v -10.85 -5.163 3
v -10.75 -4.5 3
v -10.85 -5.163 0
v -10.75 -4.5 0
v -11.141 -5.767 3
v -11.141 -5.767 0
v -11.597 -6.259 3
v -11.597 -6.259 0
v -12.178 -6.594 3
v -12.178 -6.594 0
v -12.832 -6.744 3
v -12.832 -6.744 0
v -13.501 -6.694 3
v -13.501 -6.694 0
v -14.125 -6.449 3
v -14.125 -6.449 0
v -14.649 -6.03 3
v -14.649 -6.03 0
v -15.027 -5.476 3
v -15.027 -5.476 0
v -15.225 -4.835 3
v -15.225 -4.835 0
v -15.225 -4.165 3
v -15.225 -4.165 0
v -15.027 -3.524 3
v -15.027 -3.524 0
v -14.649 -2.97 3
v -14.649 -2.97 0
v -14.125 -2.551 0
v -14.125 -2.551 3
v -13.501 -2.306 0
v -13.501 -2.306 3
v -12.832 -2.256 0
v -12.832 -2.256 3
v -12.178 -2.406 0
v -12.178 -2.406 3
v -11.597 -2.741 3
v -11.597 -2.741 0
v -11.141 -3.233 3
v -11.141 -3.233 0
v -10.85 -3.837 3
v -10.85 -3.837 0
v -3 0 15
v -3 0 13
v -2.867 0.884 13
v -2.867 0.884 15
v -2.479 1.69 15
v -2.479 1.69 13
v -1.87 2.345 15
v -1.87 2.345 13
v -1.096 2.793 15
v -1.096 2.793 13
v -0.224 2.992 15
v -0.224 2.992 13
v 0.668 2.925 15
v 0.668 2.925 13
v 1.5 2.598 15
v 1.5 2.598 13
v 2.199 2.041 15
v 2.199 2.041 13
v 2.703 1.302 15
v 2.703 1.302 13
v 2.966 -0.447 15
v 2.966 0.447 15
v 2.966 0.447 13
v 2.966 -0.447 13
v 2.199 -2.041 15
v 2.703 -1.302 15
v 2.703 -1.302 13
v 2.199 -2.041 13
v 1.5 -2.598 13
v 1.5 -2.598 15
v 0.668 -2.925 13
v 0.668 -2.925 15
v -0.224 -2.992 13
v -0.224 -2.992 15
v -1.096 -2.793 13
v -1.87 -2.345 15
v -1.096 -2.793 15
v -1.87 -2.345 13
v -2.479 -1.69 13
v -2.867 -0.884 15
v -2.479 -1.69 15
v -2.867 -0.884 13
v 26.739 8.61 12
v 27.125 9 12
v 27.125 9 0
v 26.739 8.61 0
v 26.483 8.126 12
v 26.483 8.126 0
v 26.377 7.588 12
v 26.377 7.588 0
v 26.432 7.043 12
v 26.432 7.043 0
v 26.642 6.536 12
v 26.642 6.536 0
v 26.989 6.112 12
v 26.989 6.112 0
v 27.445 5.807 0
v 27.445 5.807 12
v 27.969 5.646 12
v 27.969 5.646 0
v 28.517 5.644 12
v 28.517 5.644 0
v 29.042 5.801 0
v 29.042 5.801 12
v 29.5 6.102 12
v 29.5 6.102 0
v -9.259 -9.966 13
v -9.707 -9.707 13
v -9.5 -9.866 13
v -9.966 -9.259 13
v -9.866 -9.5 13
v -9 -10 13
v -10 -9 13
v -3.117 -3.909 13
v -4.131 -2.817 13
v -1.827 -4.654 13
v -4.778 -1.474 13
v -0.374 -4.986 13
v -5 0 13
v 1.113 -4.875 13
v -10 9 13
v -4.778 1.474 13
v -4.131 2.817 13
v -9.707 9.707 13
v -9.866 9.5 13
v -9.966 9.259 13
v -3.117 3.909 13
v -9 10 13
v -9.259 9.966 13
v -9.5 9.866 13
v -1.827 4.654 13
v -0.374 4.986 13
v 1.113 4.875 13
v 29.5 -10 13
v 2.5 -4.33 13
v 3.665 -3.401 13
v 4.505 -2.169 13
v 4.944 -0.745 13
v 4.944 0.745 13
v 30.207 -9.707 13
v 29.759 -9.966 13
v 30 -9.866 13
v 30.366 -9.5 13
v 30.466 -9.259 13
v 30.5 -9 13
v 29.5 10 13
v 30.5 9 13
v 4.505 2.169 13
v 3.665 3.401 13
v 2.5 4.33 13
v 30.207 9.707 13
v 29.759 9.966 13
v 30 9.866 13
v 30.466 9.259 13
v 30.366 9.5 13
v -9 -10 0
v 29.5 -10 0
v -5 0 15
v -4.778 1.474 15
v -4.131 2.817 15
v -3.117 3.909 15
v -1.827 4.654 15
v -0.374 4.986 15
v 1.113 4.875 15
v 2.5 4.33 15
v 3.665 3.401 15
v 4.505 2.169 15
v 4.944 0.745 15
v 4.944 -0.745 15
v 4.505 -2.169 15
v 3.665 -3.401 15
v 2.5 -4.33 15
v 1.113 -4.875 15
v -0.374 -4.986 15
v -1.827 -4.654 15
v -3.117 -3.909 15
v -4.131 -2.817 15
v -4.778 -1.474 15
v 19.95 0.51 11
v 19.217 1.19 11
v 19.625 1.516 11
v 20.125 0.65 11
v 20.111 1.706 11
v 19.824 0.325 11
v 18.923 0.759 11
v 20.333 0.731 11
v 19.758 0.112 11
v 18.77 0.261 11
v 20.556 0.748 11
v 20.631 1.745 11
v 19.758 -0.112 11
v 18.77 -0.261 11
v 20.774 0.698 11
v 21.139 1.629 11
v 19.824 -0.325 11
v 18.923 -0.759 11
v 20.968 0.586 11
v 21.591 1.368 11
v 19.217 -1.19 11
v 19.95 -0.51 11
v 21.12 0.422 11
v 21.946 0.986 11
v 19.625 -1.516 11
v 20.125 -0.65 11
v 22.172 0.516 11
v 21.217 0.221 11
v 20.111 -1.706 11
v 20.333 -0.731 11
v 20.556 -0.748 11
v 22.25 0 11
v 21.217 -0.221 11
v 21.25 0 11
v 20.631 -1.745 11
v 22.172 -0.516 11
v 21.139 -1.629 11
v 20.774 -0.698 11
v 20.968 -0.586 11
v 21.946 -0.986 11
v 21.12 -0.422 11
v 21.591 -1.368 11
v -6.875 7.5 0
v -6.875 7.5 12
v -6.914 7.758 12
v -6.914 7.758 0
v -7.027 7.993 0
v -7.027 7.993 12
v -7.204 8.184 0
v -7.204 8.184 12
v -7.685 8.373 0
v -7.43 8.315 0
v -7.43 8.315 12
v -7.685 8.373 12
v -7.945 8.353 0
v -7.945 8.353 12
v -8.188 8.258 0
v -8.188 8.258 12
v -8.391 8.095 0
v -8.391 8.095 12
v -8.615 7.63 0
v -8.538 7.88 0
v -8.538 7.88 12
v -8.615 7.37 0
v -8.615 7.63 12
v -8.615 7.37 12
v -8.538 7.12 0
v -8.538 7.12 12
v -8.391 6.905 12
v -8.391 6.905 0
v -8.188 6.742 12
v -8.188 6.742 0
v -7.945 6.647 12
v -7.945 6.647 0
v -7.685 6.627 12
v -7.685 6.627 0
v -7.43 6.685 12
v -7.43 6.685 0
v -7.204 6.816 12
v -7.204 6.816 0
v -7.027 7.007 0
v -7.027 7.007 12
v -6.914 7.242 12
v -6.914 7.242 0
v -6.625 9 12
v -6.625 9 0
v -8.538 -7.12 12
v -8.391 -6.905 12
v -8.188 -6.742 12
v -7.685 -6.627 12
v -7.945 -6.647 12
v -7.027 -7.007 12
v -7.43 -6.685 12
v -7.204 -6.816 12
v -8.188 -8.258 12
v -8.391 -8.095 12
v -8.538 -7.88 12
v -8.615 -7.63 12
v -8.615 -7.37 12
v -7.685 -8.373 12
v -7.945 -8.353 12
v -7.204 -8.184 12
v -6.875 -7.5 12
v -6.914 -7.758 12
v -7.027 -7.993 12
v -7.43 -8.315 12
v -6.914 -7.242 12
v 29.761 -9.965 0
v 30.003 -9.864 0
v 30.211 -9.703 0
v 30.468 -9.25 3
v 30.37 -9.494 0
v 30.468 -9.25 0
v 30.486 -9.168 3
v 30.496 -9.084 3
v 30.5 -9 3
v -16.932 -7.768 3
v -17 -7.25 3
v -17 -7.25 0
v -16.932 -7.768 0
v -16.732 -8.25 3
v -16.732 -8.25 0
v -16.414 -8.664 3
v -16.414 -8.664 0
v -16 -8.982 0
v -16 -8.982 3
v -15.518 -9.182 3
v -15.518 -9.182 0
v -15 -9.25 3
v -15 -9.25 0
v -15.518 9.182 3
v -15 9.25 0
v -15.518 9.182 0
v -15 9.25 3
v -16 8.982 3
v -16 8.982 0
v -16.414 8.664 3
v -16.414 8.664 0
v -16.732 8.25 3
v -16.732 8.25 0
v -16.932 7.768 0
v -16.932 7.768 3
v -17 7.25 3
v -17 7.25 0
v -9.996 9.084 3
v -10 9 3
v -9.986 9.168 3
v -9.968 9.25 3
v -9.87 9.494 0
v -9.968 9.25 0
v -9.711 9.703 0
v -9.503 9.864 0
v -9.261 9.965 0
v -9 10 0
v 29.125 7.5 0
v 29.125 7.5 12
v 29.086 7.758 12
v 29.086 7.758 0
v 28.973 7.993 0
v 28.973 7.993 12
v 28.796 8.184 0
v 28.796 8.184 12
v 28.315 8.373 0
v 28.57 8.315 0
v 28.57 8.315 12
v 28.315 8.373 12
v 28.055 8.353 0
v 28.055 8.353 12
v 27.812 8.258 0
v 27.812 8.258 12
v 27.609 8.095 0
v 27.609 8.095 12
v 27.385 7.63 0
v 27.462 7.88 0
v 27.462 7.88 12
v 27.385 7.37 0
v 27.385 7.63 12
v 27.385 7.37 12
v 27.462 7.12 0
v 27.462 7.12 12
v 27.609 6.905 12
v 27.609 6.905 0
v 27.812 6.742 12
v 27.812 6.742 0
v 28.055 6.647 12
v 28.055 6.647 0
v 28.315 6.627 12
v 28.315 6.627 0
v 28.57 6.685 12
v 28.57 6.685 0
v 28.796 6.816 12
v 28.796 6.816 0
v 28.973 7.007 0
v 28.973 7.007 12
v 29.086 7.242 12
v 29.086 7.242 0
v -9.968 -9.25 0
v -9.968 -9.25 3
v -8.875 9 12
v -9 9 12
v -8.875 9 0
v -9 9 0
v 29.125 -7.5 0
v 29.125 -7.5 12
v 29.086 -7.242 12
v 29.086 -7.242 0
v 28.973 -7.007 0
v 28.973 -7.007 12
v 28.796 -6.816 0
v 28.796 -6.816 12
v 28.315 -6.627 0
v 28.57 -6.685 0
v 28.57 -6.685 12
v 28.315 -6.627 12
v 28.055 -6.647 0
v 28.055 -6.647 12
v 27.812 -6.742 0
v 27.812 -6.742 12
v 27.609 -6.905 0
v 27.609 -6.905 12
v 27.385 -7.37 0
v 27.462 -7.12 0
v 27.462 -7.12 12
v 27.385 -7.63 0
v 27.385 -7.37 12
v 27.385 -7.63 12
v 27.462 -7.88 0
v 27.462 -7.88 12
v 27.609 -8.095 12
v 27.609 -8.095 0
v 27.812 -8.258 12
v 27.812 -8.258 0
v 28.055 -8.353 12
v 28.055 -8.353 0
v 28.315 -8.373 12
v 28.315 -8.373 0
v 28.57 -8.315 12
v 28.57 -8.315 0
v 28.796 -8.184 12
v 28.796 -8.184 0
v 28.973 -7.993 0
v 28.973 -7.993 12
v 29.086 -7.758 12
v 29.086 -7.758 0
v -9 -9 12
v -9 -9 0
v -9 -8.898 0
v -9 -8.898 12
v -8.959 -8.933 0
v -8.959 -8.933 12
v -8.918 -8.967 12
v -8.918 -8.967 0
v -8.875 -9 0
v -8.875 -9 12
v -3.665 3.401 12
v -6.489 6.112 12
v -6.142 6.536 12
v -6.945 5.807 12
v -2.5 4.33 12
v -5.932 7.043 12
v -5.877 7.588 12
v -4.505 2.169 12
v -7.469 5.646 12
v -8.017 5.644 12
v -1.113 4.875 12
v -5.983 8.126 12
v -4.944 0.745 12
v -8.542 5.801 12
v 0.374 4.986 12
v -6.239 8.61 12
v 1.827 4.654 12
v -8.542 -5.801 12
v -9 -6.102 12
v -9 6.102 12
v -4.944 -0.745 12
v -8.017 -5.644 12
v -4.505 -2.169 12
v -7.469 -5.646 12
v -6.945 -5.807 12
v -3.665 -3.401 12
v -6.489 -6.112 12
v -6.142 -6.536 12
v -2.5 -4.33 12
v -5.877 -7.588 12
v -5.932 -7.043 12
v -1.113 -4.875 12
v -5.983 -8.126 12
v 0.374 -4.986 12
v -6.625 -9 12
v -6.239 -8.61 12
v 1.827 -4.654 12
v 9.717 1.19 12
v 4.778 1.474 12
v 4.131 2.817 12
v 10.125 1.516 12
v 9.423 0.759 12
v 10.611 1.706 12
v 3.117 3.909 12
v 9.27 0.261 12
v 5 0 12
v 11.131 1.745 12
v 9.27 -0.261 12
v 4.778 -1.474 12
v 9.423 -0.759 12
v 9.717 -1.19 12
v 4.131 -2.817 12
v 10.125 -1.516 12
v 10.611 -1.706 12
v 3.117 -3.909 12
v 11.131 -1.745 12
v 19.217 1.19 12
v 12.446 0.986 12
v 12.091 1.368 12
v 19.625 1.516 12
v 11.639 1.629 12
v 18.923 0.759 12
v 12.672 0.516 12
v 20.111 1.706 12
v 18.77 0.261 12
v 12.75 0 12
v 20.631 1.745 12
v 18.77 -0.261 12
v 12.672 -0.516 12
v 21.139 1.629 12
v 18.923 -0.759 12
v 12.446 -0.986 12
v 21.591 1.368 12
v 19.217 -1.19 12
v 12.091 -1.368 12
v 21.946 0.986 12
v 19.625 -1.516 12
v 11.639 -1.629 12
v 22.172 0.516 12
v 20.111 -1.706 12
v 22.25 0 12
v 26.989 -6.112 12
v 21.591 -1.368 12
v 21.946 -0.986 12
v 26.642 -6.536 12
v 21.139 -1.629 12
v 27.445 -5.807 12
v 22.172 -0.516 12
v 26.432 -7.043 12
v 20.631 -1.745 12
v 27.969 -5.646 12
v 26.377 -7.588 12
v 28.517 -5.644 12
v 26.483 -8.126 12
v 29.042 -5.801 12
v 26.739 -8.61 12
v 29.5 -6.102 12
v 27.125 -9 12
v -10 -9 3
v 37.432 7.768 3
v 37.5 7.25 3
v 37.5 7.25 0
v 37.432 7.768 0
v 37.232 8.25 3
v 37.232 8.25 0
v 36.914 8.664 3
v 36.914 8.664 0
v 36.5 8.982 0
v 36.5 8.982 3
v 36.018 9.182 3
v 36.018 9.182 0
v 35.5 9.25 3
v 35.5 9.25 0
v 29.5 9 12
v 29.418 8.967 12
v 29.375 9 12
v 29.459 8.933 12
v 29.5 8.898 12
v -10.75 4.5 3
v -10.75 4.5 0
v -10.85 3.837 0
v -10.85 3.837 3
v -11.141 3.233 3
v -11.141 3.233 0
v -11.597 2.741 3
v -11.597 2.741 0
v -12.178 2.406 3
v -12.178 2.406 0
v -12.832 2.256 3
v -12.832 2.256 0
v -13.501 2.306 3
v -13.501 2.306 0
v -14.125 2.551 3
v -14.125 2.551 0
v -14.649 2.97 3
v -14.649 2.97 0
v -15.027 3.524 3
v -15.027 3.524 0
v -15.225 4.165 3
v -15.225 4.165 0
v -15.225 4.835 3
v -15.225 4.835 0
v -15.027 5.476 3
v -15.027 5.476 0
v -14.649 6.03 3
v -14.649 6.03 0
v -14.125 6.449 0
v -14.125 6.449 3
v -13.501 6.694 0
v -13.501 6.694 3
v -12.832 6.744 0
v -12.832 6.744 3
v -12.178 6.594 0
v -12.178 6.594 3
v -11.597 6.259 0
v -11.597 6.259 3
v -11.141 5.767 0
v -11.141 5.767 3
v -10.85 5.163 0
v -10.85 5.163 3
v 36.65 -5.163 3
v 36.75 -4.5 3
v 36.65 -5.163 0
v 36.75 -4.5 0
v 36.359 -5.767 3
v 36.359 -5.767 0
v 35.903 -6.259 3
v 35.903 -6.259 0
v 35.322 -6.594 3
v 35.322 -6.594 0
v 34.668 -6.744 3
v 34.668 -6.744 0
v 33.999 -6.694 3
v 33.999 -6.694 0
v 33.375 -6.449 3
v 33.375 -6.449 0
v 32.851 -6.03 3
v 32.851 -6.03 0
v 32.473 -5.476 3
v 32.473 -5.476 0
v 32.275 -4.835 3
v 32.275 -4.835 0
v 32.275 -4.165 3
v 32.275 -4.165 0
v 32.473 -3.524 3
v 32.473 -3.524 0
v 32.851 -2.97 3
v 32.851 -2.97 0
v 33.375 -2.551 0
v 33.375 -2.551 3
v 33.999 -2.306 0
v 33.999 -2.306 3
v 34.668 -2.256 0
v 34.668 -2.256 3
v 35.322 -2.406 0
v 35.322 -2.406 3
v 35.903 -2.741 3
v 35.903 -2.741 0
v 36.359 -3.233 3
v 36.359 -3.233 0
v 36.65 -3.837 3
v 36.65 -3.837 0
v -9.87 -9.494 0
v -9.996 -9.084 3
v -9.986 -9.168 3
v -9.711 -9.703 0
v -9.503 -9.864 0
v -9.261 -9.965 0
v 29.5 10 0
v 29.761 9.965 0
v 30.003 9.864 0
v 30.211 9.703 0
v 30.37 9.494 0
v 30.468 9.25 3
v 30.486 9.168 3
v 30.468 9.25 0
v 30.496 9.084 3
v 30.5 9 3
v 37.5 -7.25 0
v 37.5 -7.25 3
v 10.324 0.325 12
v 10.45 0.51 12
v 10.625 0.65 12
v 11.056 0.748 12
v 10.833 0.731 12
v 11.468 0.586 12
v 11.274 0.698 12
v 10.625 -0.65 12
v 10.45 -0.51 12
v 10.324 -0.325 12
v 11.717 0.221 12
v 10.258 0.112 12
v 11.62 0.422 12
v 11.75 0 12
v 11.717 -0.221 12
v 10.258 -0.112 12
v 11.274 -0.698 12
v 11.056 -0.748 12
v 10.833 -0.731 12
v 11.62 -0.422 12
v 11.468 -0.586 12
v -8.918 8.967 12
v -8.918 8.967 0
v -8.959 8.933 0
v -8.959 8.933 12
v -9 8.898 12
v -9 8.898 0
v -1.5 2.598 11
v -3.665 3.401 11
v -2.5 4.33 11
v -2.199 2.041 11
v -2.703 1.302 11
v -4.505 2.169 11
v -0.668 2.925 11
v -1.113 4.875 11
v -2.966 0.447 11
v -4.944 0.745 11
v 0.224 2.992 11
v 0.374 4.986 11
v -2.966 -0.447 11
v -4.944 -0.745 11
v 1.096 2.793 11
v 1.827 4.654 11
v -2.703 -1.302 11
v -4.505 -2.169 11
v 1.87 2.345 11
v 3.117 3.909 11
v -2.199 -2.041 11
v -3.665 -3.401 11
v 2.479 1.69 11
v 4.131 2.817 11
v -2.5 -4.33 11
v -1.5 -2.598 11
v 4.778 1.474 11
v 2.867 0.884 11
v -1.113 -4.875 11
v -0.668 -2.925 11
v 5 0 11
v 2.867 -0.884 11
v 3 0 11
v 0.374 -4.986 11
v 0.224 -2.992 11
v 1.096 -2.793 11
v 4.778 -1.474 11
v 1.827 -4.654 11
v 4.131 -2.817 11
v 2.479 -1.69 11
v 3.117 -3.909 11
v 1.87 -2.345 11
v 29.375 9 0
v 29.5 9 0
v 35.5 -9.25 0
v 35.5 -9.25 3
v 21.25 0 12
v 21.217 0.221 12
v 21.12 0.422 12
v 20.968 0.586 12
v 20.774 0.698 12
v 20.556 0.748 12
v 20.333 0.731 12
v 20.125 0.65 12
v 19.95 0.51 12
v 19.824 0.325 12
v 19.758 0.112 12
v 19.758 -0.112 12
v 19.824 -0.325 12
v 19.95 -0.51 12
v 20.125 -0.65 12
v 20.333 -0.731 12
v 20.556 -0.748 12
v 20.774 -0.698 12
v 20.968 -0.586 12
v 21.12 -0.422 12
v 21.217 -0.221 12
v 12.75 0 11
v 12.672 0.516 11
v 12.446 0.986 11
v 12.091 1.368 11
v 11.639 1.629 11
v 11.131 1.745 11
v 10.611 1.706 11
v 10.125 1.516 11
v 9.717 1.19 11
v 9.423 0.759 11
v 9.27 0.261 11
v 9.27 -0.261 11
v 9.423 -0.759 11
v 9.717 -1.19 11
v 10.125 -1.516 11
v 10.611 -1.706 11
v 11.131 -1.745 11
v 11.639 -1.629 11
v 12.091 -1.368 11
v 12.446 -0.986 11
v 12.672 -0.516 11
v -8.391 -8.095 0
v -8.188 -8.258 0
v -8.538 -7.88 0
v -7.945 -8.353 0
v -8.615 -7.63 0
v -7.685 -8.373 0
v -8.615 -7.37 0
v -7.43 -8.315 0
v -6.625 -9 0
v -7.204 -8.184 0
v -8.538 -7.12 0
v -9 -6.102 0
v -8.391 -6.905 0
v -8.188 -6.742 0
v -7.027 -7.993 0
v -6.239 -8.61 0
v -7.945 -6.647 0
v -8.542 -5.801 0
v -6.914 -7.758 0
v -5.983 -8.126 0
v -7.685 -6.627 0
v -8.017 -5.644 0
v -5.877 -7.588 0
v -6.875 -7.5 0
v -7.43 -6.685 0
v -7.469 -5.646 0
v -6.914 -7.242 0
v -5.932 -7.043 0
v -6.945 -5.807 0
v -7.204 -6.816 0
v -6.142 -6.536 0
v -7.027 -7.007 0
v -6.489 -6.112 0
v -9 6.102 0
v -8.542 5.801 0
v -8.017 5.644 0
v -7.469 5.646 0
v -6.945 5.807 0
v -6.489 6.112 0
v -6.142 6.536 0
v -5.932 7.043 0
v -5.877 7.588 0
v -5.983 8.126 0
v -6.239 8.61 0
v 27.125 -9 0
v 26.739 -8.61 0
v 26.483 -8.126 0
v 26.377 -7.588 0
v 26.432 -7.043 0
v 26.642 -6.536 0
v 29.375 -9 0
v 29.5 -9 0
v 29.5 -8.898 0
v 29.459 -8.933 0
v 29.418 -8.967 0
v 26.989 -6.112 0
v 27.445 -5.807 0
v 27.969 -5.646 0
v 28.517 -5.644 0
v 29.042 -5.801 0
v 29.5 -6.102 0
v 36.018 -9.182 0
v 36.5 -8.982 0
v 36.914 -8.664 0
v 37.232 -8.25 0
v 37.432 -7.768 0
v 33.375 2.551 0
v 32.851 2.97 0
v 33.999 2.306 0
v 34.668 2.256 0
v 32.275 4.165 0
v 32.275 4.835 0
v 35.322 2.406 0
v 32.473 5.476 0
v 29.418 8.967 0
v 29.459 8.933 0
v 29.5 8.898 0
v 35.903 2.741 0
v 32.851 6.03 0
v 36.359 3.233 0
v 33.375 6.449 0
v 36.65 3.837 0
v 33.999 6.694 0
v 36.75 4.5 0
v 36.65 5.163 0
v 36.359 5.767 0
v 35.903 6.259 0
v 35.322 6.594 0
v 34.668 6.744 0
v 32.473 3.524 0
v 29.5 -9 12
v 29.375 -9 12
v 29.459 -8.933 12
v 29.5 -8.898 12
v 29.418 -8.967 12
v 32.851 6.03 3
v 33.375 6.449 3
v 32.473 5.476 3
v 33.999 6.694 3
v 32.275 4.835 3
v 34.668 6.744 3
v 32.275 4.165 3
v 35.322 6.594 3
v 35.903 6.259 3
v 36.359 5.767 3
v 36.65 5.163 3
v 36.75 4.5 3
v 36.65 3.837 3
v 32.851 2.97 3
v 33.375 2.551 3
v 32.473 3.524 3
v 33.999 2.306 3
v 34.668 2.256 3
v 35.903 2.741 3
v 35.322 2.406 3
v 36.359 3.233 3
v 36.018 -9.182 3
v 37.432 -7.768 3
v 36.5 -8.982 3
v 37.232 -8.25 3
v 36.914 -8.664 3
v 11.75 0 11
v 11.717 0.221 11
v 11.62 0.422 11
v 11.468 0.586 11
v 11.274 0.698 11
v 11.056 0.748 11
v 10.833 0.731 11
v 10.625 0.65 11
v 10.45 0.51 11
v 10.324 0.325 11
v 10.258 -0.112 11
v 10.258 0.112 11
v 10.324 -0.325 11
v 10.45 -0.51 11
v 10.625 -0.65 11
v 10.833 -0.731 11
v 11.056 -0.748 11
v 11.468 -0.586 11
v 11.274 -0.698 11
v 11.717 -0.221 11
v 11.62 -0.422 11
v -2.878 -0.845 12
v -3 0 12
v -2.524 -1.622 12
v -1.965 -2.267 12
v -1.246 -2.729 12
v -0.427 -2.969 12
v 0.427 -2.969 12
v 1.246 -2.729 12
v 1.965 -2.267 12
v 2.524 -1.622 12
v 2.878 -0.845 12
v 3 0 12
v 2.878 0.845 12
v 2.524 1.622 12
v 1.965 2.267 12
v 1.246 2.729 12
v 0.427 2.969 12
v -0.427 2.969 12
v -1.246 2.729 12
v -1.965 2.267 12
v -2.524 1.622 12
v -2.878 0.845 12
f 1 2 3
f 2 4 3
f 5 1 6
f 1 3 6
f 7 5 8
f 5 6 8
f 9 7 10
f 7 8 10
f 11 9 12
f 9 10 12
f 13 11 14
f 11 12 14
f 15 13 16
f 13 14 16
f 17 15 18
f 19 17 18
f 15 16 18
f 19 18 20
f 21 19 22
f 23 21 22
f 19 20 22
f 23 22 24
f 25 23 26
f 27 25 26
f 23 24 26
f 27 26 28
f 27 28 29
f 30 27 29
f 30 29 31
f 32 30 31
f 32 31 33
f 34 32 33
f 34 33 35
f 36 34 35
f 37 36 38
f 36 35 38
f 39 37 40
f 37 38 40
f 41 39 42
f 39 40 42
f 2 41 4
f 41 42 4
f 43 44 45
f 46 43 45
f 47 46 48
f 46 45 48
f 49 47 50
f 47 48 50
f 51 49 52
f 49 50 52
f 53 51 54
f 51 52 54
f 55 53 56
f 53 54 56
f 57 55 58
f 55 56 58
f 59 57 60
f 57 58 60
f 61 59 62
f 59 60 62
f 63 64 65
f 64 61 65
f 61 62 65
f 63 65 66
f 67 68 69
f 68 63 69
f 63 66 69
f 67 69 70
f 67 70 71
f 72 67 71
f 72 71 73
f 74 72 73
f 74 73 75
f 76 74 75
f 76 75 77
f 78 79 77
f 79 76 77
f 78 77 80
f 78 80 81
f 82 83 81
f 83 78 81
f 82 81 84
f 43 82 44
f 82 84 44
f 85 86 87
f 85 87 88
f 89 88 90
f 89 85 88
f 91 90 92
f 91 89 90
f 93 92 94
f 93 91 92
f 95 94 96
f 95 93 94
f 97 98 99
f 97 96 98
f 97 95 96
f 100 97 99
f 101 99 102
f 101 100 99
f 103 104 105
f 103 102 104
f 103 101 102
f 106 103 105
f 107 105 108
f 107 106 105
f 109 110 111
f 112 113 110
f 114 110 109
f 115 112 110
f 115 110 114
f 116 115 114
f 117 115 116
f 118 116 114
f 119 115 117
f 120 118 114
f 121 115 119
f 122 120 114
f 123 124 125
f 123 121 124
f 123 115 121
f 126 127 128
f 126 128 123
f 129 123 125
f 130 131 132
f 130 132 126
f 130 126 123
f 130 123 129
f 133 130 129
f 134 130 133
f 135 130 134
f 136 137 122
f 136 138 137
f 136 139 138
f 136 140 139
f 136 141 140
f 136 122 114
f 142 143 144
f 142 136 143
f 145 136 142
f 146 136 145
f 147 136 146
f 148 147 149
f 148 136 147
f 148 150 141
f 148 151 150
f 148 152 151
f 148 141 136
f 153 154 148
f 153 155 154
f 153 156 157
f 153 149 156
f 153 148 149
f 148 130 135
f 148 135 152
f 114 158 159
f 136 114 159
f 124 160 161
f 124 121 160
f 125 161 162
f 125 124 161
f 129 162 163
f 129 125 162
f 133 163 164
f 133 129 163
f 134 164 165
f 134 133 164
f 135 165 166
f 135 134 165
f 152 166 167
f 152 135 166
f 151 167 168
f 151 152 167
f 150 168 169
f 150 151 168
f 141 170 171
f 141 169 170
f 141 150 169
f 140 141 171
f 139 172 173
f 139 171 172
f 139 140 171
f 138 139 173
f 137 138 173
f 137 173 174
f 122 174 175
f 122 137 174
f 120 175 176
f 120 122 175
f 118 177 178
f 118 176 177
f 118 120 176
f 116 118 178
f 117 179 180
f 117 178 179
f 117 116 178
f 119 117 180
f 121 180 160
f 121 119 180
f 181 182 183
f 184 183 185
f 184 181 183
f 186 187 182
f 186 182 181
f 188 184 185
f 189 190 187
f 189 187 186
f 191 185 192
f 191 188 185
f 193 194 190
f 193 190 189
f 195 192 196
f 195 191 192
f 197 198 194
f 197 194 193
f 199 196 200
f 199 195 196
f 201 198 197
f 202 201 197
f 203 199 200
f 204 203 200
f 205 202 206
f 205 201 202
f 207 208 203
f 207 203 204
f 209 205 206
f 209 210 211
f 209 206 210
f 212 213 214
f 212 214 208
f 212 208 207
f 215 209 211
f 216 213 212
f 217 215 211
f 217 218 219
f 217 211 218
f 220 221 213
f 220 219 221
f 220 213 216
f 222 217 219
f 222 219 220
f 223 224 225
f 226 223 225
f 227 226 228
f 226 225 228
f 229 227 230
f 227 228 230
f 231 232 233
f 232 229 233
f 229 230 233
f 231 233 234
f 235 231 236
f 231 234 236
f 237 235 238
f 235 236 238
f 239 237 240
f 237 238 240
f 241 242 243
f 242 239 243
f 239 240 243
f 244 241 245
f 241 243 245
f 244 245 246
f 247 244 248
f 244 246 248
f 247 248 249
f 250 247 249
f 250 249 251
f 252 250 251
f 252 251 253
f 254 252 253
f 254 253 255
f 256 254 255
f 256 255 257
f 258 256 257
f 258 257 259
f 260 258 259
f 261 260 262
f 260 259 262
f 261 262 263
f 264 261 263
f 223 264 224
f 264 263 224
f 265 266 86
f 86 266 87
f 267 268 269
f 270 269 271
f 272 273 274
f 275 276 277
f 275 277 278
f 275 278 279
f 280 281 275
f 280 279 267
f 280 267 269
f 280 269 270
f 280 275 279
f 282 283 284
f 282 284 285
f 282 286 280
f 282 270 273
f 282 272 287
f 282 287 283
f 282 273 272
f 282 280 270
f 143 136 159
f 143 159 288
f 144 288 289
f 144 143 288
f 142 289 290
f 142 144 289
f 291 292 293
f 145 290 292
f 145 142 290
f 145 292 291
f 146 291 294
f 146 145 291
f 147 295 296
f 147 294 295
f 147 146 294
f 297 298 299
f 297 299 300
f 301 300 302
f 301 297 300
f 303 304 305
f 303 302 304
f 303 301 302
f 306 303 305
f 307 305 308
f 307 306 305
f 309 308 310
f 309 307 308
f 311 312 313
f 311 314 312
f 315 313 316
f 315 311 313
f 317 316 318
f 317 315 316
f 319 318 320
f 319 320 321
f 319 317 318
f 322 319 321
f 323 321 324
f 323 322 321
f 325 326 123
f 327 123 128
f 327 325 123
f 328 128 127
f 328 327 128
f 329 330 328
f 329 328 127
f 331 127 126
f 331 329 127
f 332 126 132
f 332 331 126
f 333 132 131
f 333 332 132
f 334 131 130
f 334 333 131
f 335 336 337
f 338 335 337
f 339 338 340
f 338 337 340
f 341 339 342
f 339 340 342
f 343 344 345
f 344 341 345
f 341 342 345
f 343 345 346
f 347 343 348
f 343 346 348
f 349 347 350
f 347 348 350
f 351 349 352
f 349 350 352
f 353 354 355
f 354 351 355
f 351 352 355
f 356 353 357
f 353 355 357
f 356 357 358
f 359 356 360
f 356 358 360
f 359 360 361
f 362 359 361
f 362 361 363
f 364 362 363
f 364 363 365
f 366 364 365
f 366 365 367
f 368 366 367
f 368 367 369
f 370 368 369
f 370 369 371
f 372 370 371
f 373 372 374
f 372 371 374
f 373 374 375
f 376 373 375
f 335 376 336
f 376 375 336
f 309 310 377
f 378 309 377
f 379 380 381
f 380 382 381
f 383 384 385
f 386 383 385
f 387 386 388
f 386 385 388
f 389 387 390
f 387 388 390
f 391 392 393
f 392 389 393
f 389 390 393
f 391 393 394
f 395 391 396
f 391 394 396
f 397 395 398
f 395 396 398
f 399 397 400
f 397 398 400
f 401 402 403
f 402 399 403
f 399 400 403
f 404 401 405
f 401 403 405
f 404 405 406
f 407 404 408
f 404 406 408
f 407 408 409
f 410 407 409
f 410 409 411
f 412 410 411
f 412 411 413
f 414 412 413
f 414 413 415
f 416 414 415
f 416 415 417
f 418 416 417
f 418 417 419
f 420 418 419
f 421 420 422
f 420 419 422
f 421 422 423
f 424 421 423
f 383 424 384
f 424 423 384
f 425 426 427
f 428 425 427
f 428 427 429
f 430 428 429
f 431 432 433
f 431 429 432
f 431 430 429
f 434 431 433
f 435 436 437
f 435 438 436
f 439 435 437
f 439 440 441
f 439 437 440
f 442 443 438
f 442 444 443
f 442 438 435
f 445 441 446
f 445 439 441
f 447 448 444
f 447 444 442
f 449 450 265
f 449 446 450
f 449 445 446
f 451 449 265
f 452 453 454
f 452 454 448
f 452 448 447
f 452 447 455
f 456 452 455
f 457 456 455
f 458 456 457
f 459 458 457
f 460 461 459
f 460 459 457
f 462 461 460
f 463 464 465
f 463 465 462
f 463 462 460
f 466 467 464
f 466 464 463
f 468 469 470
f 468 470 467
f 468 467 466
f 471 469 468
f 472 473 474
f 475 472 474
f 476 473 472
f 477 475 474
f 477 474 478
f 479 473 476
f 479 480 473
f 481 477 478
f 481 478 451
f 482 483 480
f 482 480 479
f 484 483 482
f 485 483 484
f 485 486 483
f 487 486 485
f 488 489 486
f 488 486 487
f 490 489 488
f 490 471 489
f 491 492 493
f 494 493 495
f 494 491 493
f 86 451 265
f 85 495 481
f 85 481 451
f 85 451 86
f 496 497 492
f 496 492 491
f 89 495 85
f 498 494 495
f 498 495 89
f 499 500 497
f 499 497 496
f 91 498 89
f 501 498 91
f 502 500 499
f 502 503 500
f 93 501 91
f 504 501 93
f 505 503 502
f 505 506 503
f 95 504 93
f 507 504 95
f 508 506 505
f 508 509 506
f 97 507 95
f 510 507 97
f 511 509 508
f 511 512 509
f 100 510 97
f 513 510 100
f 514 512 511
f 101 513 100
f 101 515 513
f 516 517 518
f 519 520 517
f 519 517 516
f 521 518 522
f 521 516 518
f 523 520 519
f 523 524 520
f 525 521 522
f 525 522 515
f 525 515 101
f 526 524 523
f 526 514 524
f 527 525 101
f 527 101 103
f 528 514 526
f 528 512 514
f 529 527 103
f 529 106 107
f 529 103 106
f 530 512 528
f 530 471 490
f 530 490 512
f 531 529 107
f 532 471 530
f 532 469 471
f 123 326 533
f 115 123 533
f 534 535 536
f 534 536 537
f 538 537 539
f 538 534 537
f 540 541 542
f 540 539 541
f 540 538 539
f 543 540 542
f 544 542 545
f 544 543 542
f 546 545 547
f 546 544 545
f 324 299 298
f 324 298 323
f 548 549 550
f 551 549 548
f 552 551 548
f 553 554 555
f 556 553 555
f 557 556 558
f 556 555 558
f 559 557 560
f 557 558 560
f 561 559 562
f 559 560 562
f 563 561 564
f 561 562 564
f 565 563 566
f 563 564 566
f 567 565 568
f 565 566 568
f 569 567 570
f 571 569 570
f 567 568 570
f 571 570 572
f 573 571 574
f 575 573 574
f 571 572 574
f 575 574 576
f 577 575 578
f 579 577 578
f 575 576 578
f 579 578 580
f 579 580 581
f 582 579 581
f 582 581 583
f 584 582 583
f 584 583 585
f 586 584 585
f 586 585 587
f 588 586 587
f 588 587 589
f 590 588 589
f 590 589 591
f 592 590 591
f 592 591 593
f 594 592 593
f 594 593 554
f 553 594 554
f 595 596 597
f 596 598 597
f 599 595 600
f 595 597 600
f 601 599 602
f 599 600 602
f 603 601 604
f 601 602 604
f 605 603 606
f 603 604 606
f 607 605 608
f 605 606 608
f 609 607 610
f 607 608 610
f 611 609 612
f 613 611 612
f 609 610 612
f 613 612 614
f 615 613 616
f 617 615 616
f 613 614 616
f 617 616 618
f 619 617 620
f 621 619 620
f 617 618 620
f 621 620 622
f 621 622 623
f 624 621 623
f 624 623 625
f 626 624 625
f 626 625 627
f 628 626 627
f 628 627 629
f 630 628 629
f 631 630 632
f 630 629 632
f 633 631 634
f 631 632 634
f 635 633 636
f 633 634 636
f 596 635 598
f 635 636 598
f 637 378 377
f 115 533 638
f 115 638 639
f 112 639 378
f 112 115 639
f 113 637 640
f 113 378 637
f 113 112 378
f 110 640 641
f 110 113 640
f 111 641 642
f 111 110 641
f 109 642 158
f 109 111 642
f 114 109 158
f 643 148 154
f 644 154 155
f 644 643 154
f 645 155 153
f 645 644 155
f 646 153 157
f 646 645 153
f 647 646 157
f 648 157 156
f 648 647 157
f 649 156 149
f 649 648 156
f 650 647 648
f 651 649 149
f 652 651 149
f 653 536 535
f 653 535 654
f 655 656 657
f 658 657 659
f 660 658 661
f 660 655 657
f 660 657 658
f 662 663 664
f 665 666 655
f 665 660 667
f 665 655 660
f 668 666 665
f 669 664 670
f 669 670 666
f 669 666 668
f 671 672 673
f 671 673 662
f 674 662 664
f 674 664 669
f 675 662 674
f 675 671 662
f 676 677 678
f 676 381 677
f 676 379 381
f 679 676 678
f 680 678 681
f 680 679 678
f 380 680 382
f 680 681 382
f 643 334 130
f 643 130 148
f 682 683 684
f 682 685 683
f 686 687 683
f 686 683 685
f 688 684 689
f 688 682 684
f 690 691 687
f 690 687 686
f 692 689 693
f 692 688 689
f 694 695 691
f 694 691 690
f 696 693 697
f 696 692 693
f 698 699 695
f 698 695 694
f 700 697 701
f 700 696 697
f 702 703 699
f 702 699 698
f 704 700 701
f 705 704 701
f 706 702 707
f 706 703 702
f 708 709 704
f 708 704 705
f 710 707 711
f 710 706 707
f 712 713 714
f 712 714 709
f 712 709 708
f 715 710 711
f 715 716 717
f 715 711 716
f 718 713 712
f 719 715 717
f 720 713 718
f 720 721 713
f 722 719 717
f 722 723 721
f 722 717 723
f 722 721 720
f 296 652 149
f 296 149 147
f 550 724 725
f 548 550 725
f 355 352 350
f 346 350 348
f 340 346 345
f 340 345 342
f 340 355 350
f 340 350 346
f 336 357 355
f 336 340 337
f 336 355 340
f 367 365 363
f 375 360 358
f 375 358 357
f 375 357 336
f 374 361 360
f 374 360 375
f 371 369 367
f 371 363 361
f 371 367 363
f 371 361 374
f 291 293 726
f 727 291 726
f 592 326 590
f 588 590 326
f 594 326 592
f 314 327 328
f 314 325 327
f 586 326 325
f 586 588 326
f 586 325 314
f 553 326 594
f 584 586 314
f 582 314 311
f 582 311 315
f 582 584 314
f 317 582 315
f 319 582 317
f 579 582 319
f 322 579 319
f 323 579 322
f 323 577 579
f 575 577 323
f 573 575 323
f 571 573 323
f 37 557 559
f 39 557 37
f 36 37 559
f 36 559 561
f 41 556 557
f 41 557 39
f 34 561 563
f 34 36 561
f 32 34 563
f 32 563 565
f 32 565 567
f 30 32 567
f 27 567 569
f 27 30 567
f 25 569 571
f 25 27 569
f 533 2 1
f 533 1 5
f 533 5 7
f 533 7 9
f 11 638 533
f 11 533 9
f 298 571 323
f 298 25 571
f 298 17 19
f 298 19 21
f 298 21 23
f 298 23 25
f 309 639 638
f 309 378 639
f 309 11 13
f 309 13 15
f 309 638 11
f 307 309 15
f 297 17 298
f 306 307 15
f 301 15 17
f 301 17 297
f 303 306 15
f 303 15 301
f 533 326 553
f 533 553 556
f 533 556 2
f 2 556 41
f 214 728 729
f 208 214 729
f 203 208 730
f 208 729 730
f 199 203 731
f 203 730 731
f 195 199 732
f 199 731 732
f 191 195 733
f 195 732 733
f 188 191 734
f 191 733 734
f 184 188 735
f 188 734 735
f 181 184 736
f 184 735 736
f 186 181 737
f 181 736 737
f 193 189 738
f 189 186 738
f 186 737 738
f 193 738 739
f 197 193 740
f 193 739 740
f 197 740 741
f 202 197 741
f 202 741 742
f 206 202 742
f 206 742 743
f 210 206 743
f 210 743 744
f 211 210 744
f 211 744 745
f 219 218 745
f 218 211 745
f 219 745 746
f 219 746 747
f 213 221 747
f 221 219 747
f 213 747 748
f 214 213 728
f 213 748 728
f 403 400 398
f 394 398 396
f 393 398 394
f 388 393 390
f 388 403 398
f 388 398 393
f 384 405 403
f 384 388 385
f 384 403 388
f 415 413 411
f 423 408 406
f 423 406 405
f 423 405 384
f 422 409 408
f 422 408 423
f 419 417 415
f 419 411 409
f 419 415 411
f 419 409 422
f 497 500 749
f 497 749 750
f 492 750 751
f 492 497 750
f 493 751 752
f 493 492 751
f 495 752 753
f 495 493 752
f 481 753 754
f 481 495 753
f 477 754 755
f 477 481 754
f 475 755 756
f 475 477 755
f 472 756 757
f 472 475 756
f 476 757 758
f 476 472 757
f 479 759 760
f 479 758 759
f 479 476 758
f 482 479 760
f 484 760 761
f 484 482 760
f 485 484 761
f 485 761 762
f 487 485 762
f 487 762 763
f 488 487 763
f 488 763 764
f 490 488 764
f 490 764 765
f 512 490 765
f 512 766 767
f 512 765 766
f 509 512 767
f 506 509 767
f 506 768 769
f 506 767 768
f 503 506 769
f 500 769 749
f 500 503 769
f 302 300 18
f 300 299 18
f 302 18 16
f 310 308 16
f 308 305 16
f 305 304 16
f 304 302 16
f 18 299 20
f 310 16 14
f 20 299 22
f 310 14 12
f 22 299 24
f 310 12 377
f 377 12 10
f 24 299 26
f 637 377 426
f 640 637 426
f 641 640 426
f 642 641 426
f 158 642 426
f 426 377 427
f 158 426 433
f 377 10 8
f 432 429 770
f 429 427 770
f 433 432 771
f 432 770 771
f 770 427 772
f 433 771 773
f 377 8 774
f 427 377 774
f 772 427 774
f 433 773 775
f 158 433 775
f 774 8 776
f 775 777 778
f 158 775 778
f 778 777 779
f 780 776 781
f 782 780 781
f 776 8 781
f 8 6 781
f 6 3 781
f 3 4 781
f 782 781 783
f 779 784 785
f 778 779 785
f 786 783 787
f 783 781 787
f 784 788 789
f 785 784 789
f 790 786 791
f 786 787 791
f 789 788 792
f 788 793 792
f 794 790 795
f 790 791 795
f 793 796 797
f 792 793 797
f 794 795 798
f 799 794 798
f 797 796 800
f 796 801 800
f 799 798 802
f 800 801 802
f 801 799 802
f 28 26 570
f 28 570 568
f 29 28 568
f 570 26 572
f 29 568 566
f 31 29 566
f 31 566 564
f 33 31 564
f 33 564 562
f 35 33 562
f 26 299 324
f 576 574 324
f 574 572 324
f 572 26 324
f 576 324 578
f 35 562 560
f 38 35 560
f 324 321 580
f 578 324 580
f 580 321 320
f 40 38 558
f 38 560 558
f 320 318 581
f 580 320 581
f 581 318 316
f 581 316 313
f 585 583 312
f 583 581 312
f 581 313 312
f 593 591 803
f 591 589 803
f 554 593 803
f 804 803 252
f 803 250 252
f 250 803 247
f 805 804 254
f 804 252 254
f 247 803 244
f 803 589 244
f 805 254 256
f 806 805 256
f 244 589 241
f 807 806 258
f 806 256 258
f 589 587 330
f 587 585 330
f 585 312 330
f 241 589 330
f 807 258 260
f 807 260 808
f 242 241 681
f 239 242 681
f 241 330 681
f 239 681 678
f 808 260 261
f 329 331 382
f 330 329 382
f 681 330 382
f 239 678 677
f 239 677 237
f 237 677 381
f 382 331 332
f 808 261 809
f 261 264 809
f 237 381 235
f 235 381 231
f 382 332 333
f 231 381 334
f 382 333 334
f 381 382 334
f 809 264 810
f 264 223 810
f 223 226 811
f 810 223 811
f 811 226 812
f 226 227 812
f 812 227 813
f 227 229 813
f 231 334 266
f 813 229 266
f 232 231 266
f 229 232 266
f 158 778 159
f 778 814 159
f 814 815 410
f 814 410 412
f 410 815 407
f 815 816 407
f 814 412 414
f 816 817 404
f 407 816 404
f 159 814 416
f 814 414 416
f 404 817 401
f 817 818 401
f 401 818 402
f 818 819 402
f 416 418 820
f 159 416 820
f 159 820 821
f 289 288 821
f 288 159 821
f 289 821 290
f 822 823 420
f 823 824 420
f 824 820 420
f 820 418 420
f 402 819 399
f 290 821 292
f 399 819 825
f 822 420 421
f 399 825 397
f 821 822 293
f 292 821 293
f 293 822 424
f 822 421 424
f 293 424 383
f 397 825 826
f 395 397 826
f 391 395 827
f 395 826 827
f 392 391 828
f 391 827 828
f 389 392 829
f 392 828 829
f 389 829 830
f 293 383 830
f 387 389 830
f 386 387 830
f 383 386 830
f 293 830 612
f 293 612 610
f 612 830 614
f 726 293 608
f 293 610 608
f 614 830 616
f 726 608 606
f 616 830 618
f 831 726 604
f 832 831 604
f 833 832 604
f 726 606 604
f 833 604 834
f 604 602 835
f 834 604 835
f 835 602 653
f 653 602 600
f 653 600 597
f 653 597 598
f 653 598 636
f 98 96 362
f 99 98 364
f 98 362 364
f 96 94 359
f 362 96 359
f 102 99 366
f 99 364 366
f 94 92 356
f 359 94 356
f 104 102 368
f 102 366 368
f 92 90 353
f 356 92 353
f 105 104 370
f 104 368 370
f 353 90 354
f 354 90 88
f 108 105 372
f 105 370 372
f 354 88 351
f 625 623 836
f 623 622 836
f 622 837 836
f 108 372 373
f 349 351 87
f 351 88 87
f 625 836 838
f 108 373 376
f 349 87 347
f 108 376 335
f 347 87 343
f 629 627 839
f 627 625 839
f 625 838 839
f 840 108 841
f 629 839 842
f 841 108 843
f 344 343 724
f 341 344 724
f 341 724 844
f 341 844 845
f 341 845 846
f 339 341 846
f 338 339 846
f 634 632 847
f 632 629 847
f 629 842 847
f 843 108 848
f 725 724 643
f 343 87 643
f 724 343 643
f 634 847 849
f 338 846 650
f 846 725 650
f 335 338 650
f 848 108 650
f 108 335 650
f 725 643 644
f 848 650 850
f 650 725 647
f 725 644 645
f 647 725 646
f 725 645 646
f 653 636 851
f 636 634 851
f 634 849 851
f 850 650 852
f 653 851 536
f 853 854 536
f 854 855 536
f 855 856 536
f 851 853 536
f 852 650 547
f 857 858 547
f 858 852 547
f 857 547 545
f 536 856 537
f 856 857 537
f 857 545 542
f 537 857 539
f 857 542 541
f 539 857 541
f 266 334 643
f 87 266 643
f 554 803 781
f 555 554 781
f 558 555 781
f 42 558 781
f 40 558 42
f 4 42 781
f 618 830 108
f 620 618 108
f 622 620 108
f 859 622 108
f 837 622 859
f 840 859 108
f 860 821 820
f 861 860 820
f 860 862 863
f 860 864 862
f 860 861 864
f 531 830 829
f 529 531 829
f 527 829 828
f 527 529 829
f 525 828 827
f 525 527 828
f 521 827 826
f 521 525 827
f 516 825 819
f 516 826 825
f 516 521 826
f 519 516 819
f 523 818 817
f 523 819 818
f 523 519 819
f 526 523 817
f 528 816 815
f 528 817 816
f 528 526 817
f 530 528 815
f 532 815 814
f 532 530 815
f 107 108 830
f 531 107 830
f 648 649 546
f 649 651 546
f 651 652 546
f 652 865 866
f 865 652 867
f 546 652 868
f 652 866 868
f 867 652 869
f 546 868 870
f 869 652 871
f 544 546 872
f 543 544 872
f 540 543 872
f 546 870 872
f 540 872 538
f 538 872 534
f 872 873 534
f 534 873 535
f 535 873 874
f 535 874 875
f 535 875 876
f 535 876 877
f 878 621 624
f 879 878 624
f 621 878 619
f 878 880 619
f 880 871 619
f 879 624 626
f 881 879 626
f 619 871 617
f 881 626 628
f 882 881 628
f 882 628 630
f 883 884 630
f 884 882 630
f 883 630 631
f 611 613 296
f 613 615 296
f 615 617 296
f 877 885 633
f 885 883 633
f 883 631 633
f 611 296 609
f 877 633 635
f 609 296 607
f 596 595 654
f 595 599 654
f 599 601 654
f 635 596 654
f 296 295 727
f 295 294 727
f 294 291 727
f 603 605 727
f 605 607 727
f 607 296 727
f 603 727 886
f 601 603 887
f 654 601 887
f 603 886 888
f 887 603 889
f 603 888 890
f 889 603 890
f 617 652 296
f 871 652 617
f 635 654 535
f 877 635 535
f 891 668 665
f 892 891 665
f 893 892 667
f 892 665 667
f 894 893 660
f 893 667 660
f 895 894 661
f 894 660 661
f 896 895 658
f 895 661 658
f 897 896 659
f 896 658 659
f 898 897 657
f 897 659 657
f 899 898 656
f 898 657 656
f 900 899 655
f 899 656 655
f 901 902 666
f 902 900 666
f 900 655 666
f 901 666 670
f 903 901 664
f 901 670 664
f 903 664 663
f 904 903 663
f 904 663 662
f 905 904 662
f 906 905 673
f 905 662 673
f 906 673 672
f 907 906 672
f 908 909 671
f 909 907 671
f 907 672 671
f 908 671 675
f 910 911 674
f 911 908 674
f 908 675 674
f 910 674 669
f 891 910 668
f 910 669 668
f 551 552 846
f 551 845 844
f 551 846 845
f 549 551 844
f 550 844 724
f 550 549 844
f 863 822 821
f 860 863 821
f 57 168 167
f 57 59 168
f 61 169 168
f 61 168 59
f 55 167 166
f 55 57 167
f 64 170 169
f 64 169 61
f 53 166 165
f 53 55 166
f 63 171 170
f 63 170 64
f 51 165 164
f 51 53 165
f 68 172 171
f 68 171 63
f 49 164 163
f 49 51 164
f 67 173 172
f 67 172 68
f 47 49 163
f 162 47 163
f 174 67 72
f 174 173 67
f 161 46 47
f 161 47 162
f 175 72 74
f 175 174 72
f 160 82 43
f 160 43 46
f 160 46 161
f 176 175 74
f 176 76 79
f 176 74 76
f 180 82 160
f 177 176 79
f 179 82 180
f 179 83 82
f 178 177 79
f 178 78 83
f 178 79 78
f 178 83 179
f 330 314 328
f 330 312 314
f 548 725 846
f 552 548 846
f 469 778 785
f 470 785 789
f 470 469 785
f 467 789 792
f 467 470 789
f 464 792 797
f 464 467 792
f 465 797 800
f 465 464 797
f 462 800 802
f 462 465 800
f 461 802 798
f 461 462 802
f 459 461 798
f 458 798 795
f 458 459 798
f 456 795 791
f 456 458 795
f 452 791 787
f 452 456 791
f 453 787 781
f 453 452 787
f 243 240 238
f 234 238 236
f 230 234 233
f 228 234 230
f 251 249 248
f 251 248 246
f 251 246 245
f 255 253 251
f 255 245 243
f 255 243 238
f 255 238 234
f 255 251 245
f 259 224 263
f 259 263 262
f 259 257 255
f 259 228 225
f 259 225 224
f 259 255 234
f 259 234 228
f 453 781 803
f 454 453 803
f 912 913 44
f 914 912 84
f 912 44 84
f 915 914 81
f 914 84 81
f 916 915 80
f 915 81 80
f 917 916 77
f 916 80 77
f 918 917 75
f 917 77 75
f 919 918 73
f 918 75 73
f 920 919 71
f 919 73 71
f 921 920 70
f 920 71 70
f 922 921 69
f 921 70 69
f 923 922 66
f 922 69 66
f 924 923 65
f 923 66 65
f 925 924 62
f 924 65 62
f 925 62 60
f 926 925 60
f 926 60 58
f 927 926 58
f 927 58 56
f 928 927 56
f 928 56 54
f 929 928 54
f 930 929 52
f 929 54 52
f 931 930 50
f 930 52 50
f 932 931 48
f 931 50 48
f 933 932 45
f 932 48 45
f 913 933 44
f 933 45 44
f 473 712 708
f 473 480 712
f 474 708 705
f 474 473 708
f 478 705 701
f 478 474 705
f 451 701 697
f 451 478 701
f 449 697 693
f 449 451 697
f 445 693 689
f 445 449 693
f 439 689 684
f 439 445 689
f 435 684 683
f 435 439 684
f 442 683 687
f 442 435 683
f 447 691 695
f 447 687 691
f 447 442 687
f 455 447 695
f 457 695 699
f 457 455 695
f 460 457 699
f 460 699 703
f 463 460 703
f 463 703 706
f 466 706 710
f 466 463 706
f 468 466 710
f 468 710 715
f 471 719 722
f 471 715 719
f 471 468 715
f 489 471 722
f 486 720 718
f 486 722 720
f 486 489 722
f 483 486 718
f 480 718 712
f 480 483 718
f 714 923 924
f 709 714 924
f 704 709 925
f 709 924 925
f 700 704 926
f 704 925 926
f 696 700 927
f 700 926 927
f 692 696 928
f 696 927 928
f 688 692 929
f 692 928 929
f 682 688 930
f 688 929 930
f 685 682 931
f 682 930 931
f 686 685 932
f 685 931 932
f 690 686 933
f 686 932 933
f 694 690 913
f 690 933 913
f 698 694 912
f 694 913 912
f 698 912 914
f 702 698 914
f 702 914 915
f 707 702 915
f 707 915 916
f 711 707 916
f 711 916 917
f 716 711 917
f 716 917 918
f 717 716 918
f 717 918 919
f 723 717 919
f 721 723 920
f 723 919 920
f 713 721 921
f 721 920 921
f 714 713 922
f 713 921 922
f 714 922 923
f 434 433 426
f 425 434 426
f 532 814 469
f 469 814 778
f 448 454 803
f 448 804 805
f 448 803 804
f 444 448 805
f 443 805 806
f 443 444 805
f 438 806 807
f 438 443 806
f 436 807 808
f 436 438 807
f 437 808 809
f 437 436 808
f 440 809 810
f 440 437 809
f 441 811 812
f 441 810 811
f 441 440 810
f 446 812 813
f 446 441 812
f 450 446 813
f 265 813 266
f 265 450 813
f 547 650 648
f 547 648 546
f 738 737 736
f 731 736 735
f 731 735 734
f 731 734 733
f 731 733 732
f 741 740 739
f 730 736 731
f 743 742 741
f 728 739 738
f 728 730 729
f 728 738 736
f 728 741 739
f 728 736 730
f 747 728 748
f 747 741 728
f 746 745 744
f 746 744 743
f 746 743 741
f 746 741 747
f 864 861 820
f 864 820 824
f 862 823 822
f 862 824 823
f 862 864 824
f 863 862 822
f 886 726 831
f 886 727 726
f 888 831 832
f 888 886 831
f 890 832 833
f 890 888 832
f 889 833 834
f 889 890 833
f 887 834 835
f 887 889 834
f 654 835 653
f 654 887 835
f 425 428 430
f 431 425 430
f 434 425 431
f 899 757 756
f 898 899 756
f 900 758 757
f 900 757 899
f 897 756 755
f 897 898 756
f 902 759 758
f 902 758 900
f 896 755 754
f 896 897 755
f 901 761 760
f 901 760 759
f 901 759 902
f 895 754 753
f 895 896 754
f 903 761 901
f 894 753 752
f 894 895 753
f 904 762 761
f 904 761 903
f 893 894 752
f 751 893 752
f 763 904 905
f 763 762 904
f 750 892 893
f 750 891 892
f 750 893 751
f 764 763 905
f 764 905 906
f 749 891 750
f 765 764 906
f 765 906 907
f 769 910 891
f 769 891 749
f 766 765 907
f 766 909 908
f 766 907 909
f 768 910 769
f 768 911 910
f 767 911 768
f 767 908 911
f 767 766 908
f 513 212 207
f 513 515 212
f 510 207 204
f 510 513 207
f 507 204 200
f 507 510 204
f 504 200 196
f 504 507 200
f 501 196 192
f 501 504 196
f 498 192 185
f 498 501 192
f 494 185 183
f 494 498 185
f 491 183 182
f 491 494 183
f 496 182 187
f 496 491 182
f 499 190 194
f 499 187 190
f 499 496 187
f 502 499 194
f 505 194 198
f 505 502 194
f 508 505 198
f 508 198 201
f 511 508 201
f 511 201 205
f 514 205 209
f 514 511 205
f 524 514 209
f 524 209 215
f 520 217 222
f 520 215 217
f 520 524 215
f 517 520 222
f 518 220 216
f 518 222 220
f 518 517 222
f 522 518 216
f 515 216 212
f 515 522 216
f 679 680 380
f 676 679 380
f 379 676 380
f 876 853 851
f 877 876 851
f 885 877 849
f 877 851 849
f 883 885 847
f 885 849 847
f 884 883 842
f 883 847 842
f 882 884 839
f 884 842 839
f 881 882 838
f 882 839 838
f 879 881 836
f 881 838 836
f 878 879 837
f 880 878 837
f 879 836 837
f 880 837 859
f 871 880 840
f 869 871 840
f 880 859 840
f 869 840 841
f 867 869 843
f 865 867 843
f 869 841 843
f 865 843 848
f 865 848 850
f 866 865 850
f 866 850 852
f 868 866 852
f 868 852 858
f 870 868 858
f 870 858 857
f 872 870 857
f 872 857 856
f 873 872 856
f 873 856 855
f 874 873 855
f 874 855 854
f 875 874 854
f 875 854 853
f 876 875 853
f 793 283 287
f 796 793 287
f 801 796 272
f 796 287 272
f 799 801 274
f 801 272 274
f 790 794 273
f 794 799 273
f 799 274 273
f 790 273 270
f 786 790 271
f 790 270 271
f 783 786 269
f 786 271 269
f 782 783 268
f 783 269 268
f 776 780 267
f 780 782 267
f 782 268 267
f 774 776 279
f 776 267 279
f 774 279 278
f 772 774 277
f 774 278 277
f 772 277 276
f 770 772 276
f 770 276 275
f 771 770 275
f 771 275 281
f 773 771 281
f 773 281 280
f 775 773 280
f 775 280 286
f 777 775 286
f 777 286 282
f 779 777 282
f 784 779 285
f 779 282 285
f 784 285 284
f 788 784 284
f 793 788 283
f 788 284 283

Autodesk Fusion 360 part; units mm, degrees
sketch "Sketch1" plane through (0, 0, 0) normal (0, 0, 1) x (1, 0, 0)
  line L0 (-19.8608, 0) -> (46.1392, 0) construction
  line L1 (-17, -9.25) -> (-10, -9.25)
  line L2 (-10, -9.25) -> (-10, -10)
  line L3 (-10, -10) -> (30.5, -10)
  line L4 (30.5, -10) -> (30.5, -9.25)
  line L5 (30.5, -9.25) -> (37.5, -9.25)
  line L6 (37.5, -9.25) -> (37.5, 0)
  circle A0 centre (-13, -4.5) radius 2.25
  line L7 (-17, -9.25) -> (-17, 0)
  circle A1 centre (34.5, -4.5) radius 2.25
  line L8 (30.5, 10) -> (30.5, 9.25)
  line L9 (-10, 9.25) -> (-10, 10)
  line L10 (-17, 9.25) -> (-17, 0)
  line L11 (37.5, 9.25) -> (37.5, 0)
  line L12 (30.5, 9.25) -> (37.5, 9.25)
  circle A2 centre (-13, 4.5) radius 2.25
  line L13 (-10, 10) -> (30.5, 10)
  line L14 (-17, 9.25) -> (-10, 9.25)
  circle A3 centre (34.5, 4.5) radius 2.25
  point P0 (46.1392, 0)
  point P1 (-19.8608, 0)
  dimension "d1" = 4.5
  dimension "d2" = 10
  dimension "d3" = 4.5
  dimension "d4" = 47.5
  dimension "d5" = 7
  dimension "d6" = 7
  dimension "d7" = 4
  dimension "d8" = 4
  dimension "d9" = 4.5
  dimension "d10" = 4.5
  dimension "d11" = 10
  dimension "d12" = 10
  dimension "d13" = 9.25
  dimension "d14" = 9.25
extrude "Extrude1" add sketch "Sketch1" along normal blind 13
sketch "Sketch3" plane through (0, -9.25, 0) normal (0, -1, 0) x (1, 0, 0)
  line L0 (30.5, 0) -> (37.5, 0)
  line L1 (37.5, 0) -> (37.5, 13)
  line L2 (37.5, 13) -> (30.5, 13)
  line L3 (30.5, 13) -> (30.5, 0)
  line L4 (37.5, 0) -> (30.5, 0)
  line L5 (30.5, 0) -> (30.5, 3)
  line L6 (30.5, 3) -> (37.5, 3)
  line L7 (37.5, 3) -> (37.5, 0)
  line L8 (-10, 0) -> (-17, 0)
  line L9 (-17, 0) -> (-17, 3)
  line L10 (-17, 3) -> (-10, 3)
  line L11 (-10, 3) -> (-10, 0)
  dimension "d21" = 3
  dimension "d22" = 3
extrude "Extrude3" cut sketch "Sketch3" against normal blind 26 contours L1 L2 L3 L6
sketch "Sketch4" plane through (0, -9.25, 0) normal (0, -1, 0) x (1, 0, 0)
  line L0 (-17, 0) -> (-10, 0)
  line L1 (-10, 0) -> (-10, 13)
  line L2 (-10, 13) -> (-17, 13)
  line L3 (-17, 13) -> (-17, 0)
  line L4 (-17, 0) -> (-10, 0)
  line L5 (-10, 0) -> (-10, 3)
  line L6 (-10, 3) -> (-17, 3)
  line L7 (-17, 3) -> (-17, 0)
  dimension "d25" = 3
extrude "Extrude4" cut sketch "Sketch4" against normal blind 22 contours L1 L2 L3 L6
sketch "Sketch5" plane through (0, 0, 13) normal (0, 0, 1) x (-1, 0, 0)
  line L0 (10, -10) -> (10, 10)
  line L1 (10, 10) -> (-30.5, 10)
  line L2 (-30.5, 10) -> (-30.5, -10)
  line L3 (-30.5, -10) -> (10, -10)
  circle A0 centre (0, 0) radius 3
  dimension "d28" = 6
extrude "Extrude5" cut sketch "Sketch5" against normal blind 21 contours A0
sketch "Sketch6" plane through (0, 0, 0) normal (0, 0, -1) x (-1, 0, 0)
  circle A0 centre (0, 0) radius 3
  line L0 (10, -10) -> (10, 10)
  line L1 (10, 10) -> (-33, 10)
  line L2 (-33, 10) -> (-33, -10)
  line L3 (-33, -10) -> (10, -10)
  circle A1 centre (-11, 0) radius 0.75
  circle A2 centre (-20.5, 0) radius 0.75
  circle A3 centre (0, 0) radius 3
  circle A4 centre (-34.5, 4.5) radius 2.25
  circle A5 centre (13, -4.5) radius 2.25
  circle A6 centre (-34.5, -4.5) radius 2.25
  circle A7 centre (13, 4.5) radius 2.25
  line L4 (10, -9.25) -> (17, -9.25)
  line L5 (17, -9.25) -> (17, 9.25)
  line L6 (17, 9.25) -> (10, 9.25)
  line L7 (10, 9.25) -> (10, 10)
  line L8 (10, 10) -> (-30.5, 10)
  line L9 (-30.5, 10) -> (-30.5, 9.25)
  line L10 (-30.5, 9.25) -> (-37.5, 9.25)
  line L11 (-37.5, 9.25) -> (-37.5, -9.25)
  line L12 (-37.5, -9.25) -> (-30.5, -9.25)
  line L13 (-30.5, -9.25) -> (-30.5, -10)
  line L14 (-30.5, -10) -> (10, -10)
  line L15 (10, -10) -> (10, -9.25)
  dimension "d31" = 1.5
  dimension "d32" = 1.5
  dimension "d33" = 11
  dimension "d34" = 9.5
extrude "Extrude6" cut sketch "Sketch6" against normal blind 12 contours A1 | A2
sketch "Sketch7" plane through (0, 0, 0) normal (0, 0, -1) x (1, 0, 0)
  circle A0 centre (11, 0) radius 0.75
  circle A1 centre (20.5, 0) radius 0.75
  circle A2 centre (0, 0) radius 3
  circle A3 centre (34.5, -4.5) radius 2.25
  circle A4 centre (-13, 4.5) radius 2.25
  circle A5 centre (34.5, 4.5) radius 2.25
  circle A6 centre (-13, -4.5) radius 2.25
  line L0 (-10, 9.25) -> (-17, 9.25)
  line L1 (-17, 9.25) -> (-17, -9.25)
  line L2 (-17, -9.25) -> (-10, -9.25)
  line L3 (-10, -9.25) -> (-10, -10)
  line L4 (-10, -10) -> (30.5, -10)
  line L5 (30.5, -10) -> (30.5, -9.25)
  line L6 (30.5, -9.25) -> (37.5, -9.25)
  line L7 (37.5, -9.25) -> (37.5, 9.25)
  line L8 (37.5, 9.25) -> (30.5, 9.25)
  line L9 (30.5, 9.25) -> (30.5, 10)
  line L10 (30.5, 10) -> (-10, 10)
  line L11 (-10, 10) -> (-10, 9.25)
  line L12 (29.5, 9) -> (-9, 9)
  line L13 (-9, 9) -> (-9, -9)
  line L14 (-9, -9) -> (29.5, -9)
  line L15 (29.5, -9) -> (29.5, 9)
  line L16 (29.5, 9) -> (-9, -9) construction
  line L17 (-9, 9) -> (29.5, -9) construction
  point P0 (10.25, 0)
  dimension "d37" = 1
  dimension "d38" = 1
  dimension "d39" = 1
  dimension "d40" = 1
extrude "Extrude7" cut sketch "Sketch7" against normal blind 12 contours L12 L13 L14 L15
sketch "Sketch8" plane through (0, 0, 12) normal (0, 0, -1) x (1, 0, 0)
  circle A0 centre (0, 0) radius 3
  line L0 (29.5, -9) -> (29.5, 9)
  line L1 (29.5, 9) -> (-9, 9)
  line L2 (-9, 9) -> (-9, -9)
  line L3 (-9, -9) -> (29.5, -9)
  circle A1 centre (11, 0) radius 0.75
  circle A2 centre (20.5, 0) radius 0.75
  circle A3 centre (11, 0) radius 1.75
  circle A4 centre (20.5, 0) radius 1.75
  dimension "d43" = 1.5
  dimension "d44" = 1.5
  dimension "d45" = 9.5
  dimension "d46" = 11
  dimension "d47" = 3.5
  dimension "d48" = 3.5
extrude "Extrude8" add sketch "Sketch8" along normal blind 1 contours A3 | A4
sketch "Sketch9" plane through (0, 0, 12) normal (0, 0, -1) x (1, 0, 0)
  circle A0 centre (11, 0) radius 1.75
  circle A1 centre (0, 0) radius 3
  line L0 (29.5, -9) -> (29.5, 9)
  line L1 (29.5, 9) -> (-9, 9)
  line L2 (-9, 9) -> (-9, -9)
  line L3 (-9, -9) -> (29.5, -9)
  circle A2 centre (20.5, 0) radius 1.75
  circle A3 centre (0, 0) radius 3
  circle A4 centre (0, 0) radius 5
  dimension "d51" = 2
extrude "Extrude9" add sketch "Sketch9" along normal blind 1 contours A4
sketch "Sketch10" plane through (0, 0, 13) normal (0, 0, 1) x (-1, 0, 0)
  circle A0 centre (0, 0) radius 3
  line L0 (10, -10) -> (10, 10)
  line L1 (10, 10) -> (-30.5, 10)
  line L2 (-30.5, 10) -> (-30.5, -10)
  line L3 (-30.5, -10) -> (10, -10)
  circle A1 centre (0, 0) radius 3
  circle A2 centre (0, 0) radius 5
  dimension "d54" = 2
extrude "Extrude10" add sketch "Sketch10" along normal blind 2 contours A2
fillet "Fillet1" radius 1 4 edges at (30.5, -10, 6.5) (30.5, 10, 6.5) (-10, -10, 6.5) (-10, 10, 6.5)
fillet "Fillet2" radius 2 4 edges at (37.5, -9.25, 1.5) (37.5, 9.25, 1.5) (-17, -9.25, 1.5) (-17, 9.25, 1.5)
sketch "Sketch11" plane through (0, 0, 12) normal (0, 0, -1) x (1, 0, 0)
  circle A0 centre (0, 0) radius 5 construction
  circle A1 centre (11, 0) radius 1.75 construction
  line L0 (29.5, -9) -> (29.5, 9) construction
  line L1 (29.5, 9) -> (-9, 9) construction
  line L2 (-9, 9) -> (-9, -9) construction
  line L3 (-9, -9) -> (29.5, -9) construction
  circle A2 centre (20.5, 0) radius 1.75 construction
  line L4 (28.25, -7.5) -> (-7.75, -7.5) construction
  line L5 (-7.75, -7.5) -> (-7.75, 7.5) construction
  line L6 (-7.75, 7.5) -> (28.25, 7.5) construction
  line L7 (28.25, 7.5) -> (28.25, -7.5) construction
  circle A3 centre (-7.75, 7.5) radius 0.875
  circle A4 centre (-7.75, -7.5) radius 0.875
  circle A5 centre (28.25, 7.5) radius 0.875
  circle A6 centre (28.25, -7.5) radius 0.875
  circle A7 centre (28.25, 7.5) radius 1.875
  circle A8 centre (28.25, -7.5) radius 1.875
  circle A9 centre (-7.75, -7.5) radius 1.875
  circle A10 centre (-7.75, 7.5) radius 1.875
  line L8 (-9, 10) -> (29.5, 10)
  line L9 (-9, -10) -> (29.5, -10)
  dimension "d63" = 1.25
  dimension "d66" = 1.75
  dimension "d67" = 1
  dimension "d70" = 36
  dimension "d71" = 15
  dimension "d73" = 2.5
  dimension "d74" = 2.5
  dimension "d75" = 1.25
  dimension "d76" = 1.25
extrude "Extrude11" add sketch "Sketch11" along normal blind 12
equation "d13 = ( 18.5 / 2 ) * 1 mm"
equation "d14 = ( 18.5 / 2 ) * 1 mm"
